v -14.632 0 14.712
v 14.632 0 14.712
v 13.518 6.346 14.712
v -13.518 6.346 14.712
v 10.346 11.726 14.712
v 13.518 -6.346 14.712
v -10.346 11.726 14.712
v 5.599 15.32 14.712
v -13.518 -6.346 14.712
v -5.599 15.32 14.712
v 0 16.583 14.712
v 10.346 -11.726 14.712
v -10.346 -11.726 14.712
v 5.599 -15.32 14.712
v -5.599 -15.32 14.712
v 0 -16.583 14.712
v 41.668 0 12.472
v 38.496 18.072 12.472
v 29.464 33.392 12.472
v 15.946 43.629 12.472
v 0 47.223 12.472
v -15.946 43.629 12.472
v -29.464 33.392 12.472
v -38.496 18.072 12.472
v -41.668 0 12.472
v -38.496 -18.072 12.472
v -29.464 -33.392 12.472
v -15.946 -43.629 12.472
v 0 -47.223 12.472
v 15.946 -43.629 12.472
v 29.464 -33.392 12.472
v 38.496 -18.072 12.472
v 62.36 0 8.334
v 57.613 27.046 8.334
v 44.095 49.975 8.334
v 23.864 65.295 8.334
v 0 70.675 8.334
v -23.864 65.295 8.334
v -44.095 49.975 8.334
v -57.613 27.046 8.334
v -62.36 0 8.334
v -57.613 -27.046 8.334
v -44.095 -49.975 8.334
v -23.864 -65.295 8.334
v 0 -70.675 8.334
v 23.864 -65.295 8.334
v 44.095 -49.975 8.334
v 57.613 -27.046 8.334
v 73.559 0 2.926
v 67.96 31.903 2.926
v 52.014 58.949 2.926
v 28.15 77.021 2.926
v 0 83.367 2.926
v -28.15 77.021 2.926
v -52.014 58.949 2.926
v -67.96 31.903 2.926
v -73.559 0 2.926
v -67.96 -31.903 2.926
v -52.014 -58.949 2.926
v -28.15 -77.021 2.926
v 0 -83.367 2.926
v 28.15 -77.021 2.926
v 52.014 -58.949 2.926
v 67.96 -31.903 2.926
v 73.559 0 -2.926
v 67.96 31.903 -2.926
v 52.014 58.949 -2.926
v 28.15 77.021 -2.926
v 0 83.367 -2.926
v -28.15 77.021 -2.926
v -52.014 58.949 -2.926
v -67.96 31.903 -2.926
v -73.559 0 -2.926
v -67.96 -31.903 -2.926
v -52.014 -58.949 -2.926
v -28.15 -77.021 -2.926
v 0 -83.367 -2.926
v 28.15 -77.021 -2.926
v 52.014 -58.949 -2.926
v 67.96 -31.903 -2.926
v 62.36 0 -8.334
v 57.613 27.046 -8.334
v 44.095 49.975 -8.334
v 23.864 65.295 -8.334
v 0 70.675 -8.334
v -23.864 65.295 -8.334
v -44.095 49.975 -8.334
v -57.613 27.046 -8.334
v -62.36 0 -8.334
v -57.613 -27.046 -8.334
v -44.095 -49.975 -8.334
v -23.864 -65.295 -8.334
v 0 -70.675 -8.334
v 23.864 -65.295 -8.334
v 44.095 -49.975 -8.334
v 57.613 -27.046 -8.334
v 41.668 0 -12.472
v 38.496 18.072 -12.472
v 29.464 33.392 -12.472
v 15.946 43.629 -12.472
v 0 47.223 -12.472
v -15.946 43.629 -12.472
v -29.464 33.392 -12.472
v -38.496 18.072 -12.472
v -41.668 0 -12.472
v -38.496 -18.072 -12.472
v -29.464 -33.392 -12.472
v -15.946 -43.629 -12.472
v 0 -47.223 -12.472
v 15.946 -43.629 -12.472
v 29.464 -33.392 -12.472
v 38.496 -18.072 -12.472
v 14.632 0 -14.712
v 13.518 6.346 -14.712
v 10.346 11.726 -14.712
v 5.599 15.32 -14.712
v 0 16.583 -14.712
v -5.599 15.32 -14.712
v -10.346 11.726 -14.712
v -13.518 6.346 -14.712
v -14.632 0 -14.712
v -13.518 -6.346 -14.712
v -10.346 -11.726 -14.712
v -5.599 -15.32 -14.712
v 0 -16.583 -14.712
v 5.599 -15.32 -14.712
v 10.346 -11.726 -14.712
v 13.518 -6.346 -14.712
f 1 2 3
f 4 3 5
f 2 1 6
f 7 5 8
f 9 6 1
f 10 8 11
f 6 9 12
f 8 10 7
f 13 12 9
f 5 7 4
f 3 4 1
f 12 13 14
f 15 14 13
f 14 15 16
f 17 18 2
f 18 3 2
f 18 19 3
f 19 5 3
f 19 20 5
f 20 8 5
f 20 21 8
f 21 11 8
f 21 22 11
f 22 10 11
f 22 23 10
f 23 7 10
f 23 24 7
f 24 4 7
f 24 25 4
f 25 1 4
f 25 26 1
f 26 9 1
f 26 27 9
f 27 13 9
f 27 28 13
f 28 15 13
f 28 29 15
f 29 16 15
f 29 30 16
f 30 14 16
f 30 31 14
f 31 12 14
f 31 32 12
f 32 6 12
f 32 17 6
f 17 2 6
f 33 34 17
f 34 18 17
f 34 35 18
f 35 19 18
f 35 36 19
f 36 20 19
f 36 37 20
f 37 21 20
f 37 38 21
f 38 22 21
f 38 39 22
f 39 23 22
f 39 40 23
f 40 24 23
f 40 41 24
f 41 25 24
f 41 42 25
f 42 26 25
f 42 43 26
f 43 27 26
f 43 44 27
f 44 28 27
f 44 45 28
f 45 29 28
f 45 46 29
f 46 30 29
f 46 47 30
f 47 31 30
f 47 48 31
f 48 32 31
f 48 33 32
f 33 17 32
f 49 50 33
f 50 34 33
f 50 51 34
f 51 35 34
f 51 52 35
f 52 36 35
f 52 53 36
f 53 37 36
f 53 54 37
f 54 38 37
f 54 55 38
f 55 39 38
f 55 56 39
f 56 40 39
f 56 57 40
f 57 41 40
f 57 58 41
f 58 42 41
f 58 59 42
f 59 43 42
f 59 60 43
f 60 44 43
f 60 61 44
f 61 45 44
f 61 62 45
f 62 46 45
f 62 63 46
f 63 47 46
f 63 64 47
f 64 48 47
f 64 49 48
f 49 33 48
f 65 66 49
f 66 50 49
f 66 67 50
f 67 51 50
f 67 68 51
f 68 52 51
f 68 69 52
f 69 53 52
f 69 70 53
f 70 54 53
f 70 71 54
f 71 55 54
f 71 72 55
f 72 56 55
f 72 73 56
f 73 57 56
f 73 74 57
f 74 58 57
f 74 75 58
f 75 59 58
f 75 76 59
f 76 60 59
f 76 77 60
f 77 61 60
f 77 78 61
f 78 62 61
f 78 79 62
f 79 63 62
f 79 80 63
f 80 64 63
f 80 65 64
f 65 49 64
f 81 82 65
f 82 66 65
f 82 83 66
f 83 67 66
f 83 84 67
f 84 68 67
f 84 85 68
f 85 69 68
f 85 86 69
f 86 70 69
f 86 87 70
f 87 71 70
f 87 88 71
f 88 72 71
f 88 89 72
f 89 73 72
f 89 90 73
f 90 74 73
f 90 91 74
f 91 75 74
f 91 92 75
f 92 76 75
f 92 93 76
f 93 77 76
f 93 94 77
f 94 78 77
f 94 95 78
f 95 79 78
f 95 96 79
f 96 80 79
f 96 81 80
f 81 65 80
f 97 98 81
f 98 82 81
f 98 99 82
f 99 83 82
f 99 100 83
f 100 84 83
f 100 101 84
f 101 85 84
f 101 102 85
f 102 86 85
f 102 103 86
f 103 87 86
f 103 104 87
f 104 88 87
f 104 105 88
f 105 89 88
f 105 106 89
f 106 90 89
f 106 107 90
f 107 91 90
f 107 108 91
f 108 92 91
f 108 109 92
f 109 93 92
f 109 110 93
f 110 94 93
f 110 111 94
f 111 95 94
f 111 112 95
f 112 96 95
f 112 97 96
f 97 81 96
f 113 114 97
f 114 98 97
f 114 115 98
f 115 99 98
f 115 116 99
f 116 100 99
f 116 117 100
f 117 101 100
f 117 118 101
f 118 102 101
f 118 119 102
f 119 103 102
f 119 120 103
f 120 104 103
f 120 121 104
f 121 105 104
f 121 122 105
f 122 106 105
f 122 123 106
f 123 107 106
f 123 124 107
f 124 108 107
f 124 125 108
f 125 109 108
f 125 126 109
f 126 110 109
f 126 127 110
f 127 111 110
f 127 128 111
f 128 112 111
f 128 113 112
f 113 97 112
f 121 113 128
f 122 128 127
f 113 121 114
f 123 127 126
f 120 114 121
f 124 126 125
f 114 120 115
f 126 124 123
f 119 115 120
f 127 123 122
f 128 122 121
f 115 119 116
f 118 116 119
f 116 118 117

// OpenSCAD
// Generated by SolidPython 1.0.1 on 2020-07-29 00:46:52


scale(v = [15, 17, 3]) {
	sphere(r = 5);
}
/***********************************************
*********      SolidPython code:      **********
************************************************
 
# import packages: SolidPython
from solid import *
from solid.utils import *
from itertools import chain, combinations, permutations


class Resize:

    def __init__(self, scad_file):
        self.scad_file = scad_file
        #self.scad_file = import_scad(scad_file)
        # cone/cylinder param:
        self.r1 = 0
        self.r2 = 0
        self.h = 0
        # rectangular prism param:
        self.w = 0
        self.l = 0
        # ellipse param:
        self.r = 0

    # import OpenScad code (file name corresponds to shape)


    # classify shape + parameters
    def assign(self, param1, param2, param3):
        if self.scad_file == 'cone.scad':
            self.r1 = param1
            self.r2 = param2
            self.h = param3
        elif self.scad_file == 'cylinder.scad':
            self.r1 = param1
            self.r2 = param2
            self.h = param3
        elif self.scad_file == 'rectangularPrism.scad':
            self.h = param1
            self.l = param2
            self.w = param3
        else:
            self.r = param1
            self.h = param2

    # resize parameters
    def iterate(self):
        x = range(3, 20, 2)
        i = 1
        if self.scad_file == 'cone.scad':
            tempList = list(permutations(x, 2))
            for temp in tempList:
                param1 = temp[0]
                param2 = temp[1]
                filepath = 'produced_scad_files/' + 'cone' + str(param1) + '_' + str(param2) + '_' + '.scad'
                scad_render_to_file(cylinder(h=param1, r1=param2, r2=0), filepath)

        elif self.scad_file == 'cylinder.scad':
            tempList = list(permutations(x, 3))
            for temp in tempList:
                param1 = temp[0]
                param2 = temp[1]
                filepath = 'produced_scad_files/' + 'cylinder' + str(param1) + '_' + str(param2) + '_' + '.scad'
                scad_render_to_file(cylinder(h=param1, r1=param2, r2=param2), filepath)

        elif self.scad_file == 'rectangularPrism.scad':
            tempList = list(permutations(x, 3))
            for temp in tempList:
                param1 = temp[0]
                param2 = temp[1]
                param3 = temp[2]
                filepath = 'produced_scad_files/' + 'rectangularPrism' + str(param1) + '_' + str(param2) + '_' + str(
                    param3) + '.scad'
                scad_render_to_file(cube(size=(param1, param2, param3)), filepath)

        elif self.scad_file == 'ellipse.scad':
            tempList = list(permutations(x, 4))
            for temp in tempList:
                param1 = temp[0]
                param2 = temp[1]
                param3 = temp[2]
                param4 = temp[3]
                filepath = 'produced_scad_files/' + 'ellipse' + str(param1) + '_' + str(param2) + '_' + str(param3) + '_' + str(param4) + '.scad'
                scad_render_to_file(scale([param1, param2, param3])(sphere(r=param4)), filepath)

    def render_to_scadfile(self):
        scad_render_to_file(scad, 'example.scad') 
 
************************************************/
